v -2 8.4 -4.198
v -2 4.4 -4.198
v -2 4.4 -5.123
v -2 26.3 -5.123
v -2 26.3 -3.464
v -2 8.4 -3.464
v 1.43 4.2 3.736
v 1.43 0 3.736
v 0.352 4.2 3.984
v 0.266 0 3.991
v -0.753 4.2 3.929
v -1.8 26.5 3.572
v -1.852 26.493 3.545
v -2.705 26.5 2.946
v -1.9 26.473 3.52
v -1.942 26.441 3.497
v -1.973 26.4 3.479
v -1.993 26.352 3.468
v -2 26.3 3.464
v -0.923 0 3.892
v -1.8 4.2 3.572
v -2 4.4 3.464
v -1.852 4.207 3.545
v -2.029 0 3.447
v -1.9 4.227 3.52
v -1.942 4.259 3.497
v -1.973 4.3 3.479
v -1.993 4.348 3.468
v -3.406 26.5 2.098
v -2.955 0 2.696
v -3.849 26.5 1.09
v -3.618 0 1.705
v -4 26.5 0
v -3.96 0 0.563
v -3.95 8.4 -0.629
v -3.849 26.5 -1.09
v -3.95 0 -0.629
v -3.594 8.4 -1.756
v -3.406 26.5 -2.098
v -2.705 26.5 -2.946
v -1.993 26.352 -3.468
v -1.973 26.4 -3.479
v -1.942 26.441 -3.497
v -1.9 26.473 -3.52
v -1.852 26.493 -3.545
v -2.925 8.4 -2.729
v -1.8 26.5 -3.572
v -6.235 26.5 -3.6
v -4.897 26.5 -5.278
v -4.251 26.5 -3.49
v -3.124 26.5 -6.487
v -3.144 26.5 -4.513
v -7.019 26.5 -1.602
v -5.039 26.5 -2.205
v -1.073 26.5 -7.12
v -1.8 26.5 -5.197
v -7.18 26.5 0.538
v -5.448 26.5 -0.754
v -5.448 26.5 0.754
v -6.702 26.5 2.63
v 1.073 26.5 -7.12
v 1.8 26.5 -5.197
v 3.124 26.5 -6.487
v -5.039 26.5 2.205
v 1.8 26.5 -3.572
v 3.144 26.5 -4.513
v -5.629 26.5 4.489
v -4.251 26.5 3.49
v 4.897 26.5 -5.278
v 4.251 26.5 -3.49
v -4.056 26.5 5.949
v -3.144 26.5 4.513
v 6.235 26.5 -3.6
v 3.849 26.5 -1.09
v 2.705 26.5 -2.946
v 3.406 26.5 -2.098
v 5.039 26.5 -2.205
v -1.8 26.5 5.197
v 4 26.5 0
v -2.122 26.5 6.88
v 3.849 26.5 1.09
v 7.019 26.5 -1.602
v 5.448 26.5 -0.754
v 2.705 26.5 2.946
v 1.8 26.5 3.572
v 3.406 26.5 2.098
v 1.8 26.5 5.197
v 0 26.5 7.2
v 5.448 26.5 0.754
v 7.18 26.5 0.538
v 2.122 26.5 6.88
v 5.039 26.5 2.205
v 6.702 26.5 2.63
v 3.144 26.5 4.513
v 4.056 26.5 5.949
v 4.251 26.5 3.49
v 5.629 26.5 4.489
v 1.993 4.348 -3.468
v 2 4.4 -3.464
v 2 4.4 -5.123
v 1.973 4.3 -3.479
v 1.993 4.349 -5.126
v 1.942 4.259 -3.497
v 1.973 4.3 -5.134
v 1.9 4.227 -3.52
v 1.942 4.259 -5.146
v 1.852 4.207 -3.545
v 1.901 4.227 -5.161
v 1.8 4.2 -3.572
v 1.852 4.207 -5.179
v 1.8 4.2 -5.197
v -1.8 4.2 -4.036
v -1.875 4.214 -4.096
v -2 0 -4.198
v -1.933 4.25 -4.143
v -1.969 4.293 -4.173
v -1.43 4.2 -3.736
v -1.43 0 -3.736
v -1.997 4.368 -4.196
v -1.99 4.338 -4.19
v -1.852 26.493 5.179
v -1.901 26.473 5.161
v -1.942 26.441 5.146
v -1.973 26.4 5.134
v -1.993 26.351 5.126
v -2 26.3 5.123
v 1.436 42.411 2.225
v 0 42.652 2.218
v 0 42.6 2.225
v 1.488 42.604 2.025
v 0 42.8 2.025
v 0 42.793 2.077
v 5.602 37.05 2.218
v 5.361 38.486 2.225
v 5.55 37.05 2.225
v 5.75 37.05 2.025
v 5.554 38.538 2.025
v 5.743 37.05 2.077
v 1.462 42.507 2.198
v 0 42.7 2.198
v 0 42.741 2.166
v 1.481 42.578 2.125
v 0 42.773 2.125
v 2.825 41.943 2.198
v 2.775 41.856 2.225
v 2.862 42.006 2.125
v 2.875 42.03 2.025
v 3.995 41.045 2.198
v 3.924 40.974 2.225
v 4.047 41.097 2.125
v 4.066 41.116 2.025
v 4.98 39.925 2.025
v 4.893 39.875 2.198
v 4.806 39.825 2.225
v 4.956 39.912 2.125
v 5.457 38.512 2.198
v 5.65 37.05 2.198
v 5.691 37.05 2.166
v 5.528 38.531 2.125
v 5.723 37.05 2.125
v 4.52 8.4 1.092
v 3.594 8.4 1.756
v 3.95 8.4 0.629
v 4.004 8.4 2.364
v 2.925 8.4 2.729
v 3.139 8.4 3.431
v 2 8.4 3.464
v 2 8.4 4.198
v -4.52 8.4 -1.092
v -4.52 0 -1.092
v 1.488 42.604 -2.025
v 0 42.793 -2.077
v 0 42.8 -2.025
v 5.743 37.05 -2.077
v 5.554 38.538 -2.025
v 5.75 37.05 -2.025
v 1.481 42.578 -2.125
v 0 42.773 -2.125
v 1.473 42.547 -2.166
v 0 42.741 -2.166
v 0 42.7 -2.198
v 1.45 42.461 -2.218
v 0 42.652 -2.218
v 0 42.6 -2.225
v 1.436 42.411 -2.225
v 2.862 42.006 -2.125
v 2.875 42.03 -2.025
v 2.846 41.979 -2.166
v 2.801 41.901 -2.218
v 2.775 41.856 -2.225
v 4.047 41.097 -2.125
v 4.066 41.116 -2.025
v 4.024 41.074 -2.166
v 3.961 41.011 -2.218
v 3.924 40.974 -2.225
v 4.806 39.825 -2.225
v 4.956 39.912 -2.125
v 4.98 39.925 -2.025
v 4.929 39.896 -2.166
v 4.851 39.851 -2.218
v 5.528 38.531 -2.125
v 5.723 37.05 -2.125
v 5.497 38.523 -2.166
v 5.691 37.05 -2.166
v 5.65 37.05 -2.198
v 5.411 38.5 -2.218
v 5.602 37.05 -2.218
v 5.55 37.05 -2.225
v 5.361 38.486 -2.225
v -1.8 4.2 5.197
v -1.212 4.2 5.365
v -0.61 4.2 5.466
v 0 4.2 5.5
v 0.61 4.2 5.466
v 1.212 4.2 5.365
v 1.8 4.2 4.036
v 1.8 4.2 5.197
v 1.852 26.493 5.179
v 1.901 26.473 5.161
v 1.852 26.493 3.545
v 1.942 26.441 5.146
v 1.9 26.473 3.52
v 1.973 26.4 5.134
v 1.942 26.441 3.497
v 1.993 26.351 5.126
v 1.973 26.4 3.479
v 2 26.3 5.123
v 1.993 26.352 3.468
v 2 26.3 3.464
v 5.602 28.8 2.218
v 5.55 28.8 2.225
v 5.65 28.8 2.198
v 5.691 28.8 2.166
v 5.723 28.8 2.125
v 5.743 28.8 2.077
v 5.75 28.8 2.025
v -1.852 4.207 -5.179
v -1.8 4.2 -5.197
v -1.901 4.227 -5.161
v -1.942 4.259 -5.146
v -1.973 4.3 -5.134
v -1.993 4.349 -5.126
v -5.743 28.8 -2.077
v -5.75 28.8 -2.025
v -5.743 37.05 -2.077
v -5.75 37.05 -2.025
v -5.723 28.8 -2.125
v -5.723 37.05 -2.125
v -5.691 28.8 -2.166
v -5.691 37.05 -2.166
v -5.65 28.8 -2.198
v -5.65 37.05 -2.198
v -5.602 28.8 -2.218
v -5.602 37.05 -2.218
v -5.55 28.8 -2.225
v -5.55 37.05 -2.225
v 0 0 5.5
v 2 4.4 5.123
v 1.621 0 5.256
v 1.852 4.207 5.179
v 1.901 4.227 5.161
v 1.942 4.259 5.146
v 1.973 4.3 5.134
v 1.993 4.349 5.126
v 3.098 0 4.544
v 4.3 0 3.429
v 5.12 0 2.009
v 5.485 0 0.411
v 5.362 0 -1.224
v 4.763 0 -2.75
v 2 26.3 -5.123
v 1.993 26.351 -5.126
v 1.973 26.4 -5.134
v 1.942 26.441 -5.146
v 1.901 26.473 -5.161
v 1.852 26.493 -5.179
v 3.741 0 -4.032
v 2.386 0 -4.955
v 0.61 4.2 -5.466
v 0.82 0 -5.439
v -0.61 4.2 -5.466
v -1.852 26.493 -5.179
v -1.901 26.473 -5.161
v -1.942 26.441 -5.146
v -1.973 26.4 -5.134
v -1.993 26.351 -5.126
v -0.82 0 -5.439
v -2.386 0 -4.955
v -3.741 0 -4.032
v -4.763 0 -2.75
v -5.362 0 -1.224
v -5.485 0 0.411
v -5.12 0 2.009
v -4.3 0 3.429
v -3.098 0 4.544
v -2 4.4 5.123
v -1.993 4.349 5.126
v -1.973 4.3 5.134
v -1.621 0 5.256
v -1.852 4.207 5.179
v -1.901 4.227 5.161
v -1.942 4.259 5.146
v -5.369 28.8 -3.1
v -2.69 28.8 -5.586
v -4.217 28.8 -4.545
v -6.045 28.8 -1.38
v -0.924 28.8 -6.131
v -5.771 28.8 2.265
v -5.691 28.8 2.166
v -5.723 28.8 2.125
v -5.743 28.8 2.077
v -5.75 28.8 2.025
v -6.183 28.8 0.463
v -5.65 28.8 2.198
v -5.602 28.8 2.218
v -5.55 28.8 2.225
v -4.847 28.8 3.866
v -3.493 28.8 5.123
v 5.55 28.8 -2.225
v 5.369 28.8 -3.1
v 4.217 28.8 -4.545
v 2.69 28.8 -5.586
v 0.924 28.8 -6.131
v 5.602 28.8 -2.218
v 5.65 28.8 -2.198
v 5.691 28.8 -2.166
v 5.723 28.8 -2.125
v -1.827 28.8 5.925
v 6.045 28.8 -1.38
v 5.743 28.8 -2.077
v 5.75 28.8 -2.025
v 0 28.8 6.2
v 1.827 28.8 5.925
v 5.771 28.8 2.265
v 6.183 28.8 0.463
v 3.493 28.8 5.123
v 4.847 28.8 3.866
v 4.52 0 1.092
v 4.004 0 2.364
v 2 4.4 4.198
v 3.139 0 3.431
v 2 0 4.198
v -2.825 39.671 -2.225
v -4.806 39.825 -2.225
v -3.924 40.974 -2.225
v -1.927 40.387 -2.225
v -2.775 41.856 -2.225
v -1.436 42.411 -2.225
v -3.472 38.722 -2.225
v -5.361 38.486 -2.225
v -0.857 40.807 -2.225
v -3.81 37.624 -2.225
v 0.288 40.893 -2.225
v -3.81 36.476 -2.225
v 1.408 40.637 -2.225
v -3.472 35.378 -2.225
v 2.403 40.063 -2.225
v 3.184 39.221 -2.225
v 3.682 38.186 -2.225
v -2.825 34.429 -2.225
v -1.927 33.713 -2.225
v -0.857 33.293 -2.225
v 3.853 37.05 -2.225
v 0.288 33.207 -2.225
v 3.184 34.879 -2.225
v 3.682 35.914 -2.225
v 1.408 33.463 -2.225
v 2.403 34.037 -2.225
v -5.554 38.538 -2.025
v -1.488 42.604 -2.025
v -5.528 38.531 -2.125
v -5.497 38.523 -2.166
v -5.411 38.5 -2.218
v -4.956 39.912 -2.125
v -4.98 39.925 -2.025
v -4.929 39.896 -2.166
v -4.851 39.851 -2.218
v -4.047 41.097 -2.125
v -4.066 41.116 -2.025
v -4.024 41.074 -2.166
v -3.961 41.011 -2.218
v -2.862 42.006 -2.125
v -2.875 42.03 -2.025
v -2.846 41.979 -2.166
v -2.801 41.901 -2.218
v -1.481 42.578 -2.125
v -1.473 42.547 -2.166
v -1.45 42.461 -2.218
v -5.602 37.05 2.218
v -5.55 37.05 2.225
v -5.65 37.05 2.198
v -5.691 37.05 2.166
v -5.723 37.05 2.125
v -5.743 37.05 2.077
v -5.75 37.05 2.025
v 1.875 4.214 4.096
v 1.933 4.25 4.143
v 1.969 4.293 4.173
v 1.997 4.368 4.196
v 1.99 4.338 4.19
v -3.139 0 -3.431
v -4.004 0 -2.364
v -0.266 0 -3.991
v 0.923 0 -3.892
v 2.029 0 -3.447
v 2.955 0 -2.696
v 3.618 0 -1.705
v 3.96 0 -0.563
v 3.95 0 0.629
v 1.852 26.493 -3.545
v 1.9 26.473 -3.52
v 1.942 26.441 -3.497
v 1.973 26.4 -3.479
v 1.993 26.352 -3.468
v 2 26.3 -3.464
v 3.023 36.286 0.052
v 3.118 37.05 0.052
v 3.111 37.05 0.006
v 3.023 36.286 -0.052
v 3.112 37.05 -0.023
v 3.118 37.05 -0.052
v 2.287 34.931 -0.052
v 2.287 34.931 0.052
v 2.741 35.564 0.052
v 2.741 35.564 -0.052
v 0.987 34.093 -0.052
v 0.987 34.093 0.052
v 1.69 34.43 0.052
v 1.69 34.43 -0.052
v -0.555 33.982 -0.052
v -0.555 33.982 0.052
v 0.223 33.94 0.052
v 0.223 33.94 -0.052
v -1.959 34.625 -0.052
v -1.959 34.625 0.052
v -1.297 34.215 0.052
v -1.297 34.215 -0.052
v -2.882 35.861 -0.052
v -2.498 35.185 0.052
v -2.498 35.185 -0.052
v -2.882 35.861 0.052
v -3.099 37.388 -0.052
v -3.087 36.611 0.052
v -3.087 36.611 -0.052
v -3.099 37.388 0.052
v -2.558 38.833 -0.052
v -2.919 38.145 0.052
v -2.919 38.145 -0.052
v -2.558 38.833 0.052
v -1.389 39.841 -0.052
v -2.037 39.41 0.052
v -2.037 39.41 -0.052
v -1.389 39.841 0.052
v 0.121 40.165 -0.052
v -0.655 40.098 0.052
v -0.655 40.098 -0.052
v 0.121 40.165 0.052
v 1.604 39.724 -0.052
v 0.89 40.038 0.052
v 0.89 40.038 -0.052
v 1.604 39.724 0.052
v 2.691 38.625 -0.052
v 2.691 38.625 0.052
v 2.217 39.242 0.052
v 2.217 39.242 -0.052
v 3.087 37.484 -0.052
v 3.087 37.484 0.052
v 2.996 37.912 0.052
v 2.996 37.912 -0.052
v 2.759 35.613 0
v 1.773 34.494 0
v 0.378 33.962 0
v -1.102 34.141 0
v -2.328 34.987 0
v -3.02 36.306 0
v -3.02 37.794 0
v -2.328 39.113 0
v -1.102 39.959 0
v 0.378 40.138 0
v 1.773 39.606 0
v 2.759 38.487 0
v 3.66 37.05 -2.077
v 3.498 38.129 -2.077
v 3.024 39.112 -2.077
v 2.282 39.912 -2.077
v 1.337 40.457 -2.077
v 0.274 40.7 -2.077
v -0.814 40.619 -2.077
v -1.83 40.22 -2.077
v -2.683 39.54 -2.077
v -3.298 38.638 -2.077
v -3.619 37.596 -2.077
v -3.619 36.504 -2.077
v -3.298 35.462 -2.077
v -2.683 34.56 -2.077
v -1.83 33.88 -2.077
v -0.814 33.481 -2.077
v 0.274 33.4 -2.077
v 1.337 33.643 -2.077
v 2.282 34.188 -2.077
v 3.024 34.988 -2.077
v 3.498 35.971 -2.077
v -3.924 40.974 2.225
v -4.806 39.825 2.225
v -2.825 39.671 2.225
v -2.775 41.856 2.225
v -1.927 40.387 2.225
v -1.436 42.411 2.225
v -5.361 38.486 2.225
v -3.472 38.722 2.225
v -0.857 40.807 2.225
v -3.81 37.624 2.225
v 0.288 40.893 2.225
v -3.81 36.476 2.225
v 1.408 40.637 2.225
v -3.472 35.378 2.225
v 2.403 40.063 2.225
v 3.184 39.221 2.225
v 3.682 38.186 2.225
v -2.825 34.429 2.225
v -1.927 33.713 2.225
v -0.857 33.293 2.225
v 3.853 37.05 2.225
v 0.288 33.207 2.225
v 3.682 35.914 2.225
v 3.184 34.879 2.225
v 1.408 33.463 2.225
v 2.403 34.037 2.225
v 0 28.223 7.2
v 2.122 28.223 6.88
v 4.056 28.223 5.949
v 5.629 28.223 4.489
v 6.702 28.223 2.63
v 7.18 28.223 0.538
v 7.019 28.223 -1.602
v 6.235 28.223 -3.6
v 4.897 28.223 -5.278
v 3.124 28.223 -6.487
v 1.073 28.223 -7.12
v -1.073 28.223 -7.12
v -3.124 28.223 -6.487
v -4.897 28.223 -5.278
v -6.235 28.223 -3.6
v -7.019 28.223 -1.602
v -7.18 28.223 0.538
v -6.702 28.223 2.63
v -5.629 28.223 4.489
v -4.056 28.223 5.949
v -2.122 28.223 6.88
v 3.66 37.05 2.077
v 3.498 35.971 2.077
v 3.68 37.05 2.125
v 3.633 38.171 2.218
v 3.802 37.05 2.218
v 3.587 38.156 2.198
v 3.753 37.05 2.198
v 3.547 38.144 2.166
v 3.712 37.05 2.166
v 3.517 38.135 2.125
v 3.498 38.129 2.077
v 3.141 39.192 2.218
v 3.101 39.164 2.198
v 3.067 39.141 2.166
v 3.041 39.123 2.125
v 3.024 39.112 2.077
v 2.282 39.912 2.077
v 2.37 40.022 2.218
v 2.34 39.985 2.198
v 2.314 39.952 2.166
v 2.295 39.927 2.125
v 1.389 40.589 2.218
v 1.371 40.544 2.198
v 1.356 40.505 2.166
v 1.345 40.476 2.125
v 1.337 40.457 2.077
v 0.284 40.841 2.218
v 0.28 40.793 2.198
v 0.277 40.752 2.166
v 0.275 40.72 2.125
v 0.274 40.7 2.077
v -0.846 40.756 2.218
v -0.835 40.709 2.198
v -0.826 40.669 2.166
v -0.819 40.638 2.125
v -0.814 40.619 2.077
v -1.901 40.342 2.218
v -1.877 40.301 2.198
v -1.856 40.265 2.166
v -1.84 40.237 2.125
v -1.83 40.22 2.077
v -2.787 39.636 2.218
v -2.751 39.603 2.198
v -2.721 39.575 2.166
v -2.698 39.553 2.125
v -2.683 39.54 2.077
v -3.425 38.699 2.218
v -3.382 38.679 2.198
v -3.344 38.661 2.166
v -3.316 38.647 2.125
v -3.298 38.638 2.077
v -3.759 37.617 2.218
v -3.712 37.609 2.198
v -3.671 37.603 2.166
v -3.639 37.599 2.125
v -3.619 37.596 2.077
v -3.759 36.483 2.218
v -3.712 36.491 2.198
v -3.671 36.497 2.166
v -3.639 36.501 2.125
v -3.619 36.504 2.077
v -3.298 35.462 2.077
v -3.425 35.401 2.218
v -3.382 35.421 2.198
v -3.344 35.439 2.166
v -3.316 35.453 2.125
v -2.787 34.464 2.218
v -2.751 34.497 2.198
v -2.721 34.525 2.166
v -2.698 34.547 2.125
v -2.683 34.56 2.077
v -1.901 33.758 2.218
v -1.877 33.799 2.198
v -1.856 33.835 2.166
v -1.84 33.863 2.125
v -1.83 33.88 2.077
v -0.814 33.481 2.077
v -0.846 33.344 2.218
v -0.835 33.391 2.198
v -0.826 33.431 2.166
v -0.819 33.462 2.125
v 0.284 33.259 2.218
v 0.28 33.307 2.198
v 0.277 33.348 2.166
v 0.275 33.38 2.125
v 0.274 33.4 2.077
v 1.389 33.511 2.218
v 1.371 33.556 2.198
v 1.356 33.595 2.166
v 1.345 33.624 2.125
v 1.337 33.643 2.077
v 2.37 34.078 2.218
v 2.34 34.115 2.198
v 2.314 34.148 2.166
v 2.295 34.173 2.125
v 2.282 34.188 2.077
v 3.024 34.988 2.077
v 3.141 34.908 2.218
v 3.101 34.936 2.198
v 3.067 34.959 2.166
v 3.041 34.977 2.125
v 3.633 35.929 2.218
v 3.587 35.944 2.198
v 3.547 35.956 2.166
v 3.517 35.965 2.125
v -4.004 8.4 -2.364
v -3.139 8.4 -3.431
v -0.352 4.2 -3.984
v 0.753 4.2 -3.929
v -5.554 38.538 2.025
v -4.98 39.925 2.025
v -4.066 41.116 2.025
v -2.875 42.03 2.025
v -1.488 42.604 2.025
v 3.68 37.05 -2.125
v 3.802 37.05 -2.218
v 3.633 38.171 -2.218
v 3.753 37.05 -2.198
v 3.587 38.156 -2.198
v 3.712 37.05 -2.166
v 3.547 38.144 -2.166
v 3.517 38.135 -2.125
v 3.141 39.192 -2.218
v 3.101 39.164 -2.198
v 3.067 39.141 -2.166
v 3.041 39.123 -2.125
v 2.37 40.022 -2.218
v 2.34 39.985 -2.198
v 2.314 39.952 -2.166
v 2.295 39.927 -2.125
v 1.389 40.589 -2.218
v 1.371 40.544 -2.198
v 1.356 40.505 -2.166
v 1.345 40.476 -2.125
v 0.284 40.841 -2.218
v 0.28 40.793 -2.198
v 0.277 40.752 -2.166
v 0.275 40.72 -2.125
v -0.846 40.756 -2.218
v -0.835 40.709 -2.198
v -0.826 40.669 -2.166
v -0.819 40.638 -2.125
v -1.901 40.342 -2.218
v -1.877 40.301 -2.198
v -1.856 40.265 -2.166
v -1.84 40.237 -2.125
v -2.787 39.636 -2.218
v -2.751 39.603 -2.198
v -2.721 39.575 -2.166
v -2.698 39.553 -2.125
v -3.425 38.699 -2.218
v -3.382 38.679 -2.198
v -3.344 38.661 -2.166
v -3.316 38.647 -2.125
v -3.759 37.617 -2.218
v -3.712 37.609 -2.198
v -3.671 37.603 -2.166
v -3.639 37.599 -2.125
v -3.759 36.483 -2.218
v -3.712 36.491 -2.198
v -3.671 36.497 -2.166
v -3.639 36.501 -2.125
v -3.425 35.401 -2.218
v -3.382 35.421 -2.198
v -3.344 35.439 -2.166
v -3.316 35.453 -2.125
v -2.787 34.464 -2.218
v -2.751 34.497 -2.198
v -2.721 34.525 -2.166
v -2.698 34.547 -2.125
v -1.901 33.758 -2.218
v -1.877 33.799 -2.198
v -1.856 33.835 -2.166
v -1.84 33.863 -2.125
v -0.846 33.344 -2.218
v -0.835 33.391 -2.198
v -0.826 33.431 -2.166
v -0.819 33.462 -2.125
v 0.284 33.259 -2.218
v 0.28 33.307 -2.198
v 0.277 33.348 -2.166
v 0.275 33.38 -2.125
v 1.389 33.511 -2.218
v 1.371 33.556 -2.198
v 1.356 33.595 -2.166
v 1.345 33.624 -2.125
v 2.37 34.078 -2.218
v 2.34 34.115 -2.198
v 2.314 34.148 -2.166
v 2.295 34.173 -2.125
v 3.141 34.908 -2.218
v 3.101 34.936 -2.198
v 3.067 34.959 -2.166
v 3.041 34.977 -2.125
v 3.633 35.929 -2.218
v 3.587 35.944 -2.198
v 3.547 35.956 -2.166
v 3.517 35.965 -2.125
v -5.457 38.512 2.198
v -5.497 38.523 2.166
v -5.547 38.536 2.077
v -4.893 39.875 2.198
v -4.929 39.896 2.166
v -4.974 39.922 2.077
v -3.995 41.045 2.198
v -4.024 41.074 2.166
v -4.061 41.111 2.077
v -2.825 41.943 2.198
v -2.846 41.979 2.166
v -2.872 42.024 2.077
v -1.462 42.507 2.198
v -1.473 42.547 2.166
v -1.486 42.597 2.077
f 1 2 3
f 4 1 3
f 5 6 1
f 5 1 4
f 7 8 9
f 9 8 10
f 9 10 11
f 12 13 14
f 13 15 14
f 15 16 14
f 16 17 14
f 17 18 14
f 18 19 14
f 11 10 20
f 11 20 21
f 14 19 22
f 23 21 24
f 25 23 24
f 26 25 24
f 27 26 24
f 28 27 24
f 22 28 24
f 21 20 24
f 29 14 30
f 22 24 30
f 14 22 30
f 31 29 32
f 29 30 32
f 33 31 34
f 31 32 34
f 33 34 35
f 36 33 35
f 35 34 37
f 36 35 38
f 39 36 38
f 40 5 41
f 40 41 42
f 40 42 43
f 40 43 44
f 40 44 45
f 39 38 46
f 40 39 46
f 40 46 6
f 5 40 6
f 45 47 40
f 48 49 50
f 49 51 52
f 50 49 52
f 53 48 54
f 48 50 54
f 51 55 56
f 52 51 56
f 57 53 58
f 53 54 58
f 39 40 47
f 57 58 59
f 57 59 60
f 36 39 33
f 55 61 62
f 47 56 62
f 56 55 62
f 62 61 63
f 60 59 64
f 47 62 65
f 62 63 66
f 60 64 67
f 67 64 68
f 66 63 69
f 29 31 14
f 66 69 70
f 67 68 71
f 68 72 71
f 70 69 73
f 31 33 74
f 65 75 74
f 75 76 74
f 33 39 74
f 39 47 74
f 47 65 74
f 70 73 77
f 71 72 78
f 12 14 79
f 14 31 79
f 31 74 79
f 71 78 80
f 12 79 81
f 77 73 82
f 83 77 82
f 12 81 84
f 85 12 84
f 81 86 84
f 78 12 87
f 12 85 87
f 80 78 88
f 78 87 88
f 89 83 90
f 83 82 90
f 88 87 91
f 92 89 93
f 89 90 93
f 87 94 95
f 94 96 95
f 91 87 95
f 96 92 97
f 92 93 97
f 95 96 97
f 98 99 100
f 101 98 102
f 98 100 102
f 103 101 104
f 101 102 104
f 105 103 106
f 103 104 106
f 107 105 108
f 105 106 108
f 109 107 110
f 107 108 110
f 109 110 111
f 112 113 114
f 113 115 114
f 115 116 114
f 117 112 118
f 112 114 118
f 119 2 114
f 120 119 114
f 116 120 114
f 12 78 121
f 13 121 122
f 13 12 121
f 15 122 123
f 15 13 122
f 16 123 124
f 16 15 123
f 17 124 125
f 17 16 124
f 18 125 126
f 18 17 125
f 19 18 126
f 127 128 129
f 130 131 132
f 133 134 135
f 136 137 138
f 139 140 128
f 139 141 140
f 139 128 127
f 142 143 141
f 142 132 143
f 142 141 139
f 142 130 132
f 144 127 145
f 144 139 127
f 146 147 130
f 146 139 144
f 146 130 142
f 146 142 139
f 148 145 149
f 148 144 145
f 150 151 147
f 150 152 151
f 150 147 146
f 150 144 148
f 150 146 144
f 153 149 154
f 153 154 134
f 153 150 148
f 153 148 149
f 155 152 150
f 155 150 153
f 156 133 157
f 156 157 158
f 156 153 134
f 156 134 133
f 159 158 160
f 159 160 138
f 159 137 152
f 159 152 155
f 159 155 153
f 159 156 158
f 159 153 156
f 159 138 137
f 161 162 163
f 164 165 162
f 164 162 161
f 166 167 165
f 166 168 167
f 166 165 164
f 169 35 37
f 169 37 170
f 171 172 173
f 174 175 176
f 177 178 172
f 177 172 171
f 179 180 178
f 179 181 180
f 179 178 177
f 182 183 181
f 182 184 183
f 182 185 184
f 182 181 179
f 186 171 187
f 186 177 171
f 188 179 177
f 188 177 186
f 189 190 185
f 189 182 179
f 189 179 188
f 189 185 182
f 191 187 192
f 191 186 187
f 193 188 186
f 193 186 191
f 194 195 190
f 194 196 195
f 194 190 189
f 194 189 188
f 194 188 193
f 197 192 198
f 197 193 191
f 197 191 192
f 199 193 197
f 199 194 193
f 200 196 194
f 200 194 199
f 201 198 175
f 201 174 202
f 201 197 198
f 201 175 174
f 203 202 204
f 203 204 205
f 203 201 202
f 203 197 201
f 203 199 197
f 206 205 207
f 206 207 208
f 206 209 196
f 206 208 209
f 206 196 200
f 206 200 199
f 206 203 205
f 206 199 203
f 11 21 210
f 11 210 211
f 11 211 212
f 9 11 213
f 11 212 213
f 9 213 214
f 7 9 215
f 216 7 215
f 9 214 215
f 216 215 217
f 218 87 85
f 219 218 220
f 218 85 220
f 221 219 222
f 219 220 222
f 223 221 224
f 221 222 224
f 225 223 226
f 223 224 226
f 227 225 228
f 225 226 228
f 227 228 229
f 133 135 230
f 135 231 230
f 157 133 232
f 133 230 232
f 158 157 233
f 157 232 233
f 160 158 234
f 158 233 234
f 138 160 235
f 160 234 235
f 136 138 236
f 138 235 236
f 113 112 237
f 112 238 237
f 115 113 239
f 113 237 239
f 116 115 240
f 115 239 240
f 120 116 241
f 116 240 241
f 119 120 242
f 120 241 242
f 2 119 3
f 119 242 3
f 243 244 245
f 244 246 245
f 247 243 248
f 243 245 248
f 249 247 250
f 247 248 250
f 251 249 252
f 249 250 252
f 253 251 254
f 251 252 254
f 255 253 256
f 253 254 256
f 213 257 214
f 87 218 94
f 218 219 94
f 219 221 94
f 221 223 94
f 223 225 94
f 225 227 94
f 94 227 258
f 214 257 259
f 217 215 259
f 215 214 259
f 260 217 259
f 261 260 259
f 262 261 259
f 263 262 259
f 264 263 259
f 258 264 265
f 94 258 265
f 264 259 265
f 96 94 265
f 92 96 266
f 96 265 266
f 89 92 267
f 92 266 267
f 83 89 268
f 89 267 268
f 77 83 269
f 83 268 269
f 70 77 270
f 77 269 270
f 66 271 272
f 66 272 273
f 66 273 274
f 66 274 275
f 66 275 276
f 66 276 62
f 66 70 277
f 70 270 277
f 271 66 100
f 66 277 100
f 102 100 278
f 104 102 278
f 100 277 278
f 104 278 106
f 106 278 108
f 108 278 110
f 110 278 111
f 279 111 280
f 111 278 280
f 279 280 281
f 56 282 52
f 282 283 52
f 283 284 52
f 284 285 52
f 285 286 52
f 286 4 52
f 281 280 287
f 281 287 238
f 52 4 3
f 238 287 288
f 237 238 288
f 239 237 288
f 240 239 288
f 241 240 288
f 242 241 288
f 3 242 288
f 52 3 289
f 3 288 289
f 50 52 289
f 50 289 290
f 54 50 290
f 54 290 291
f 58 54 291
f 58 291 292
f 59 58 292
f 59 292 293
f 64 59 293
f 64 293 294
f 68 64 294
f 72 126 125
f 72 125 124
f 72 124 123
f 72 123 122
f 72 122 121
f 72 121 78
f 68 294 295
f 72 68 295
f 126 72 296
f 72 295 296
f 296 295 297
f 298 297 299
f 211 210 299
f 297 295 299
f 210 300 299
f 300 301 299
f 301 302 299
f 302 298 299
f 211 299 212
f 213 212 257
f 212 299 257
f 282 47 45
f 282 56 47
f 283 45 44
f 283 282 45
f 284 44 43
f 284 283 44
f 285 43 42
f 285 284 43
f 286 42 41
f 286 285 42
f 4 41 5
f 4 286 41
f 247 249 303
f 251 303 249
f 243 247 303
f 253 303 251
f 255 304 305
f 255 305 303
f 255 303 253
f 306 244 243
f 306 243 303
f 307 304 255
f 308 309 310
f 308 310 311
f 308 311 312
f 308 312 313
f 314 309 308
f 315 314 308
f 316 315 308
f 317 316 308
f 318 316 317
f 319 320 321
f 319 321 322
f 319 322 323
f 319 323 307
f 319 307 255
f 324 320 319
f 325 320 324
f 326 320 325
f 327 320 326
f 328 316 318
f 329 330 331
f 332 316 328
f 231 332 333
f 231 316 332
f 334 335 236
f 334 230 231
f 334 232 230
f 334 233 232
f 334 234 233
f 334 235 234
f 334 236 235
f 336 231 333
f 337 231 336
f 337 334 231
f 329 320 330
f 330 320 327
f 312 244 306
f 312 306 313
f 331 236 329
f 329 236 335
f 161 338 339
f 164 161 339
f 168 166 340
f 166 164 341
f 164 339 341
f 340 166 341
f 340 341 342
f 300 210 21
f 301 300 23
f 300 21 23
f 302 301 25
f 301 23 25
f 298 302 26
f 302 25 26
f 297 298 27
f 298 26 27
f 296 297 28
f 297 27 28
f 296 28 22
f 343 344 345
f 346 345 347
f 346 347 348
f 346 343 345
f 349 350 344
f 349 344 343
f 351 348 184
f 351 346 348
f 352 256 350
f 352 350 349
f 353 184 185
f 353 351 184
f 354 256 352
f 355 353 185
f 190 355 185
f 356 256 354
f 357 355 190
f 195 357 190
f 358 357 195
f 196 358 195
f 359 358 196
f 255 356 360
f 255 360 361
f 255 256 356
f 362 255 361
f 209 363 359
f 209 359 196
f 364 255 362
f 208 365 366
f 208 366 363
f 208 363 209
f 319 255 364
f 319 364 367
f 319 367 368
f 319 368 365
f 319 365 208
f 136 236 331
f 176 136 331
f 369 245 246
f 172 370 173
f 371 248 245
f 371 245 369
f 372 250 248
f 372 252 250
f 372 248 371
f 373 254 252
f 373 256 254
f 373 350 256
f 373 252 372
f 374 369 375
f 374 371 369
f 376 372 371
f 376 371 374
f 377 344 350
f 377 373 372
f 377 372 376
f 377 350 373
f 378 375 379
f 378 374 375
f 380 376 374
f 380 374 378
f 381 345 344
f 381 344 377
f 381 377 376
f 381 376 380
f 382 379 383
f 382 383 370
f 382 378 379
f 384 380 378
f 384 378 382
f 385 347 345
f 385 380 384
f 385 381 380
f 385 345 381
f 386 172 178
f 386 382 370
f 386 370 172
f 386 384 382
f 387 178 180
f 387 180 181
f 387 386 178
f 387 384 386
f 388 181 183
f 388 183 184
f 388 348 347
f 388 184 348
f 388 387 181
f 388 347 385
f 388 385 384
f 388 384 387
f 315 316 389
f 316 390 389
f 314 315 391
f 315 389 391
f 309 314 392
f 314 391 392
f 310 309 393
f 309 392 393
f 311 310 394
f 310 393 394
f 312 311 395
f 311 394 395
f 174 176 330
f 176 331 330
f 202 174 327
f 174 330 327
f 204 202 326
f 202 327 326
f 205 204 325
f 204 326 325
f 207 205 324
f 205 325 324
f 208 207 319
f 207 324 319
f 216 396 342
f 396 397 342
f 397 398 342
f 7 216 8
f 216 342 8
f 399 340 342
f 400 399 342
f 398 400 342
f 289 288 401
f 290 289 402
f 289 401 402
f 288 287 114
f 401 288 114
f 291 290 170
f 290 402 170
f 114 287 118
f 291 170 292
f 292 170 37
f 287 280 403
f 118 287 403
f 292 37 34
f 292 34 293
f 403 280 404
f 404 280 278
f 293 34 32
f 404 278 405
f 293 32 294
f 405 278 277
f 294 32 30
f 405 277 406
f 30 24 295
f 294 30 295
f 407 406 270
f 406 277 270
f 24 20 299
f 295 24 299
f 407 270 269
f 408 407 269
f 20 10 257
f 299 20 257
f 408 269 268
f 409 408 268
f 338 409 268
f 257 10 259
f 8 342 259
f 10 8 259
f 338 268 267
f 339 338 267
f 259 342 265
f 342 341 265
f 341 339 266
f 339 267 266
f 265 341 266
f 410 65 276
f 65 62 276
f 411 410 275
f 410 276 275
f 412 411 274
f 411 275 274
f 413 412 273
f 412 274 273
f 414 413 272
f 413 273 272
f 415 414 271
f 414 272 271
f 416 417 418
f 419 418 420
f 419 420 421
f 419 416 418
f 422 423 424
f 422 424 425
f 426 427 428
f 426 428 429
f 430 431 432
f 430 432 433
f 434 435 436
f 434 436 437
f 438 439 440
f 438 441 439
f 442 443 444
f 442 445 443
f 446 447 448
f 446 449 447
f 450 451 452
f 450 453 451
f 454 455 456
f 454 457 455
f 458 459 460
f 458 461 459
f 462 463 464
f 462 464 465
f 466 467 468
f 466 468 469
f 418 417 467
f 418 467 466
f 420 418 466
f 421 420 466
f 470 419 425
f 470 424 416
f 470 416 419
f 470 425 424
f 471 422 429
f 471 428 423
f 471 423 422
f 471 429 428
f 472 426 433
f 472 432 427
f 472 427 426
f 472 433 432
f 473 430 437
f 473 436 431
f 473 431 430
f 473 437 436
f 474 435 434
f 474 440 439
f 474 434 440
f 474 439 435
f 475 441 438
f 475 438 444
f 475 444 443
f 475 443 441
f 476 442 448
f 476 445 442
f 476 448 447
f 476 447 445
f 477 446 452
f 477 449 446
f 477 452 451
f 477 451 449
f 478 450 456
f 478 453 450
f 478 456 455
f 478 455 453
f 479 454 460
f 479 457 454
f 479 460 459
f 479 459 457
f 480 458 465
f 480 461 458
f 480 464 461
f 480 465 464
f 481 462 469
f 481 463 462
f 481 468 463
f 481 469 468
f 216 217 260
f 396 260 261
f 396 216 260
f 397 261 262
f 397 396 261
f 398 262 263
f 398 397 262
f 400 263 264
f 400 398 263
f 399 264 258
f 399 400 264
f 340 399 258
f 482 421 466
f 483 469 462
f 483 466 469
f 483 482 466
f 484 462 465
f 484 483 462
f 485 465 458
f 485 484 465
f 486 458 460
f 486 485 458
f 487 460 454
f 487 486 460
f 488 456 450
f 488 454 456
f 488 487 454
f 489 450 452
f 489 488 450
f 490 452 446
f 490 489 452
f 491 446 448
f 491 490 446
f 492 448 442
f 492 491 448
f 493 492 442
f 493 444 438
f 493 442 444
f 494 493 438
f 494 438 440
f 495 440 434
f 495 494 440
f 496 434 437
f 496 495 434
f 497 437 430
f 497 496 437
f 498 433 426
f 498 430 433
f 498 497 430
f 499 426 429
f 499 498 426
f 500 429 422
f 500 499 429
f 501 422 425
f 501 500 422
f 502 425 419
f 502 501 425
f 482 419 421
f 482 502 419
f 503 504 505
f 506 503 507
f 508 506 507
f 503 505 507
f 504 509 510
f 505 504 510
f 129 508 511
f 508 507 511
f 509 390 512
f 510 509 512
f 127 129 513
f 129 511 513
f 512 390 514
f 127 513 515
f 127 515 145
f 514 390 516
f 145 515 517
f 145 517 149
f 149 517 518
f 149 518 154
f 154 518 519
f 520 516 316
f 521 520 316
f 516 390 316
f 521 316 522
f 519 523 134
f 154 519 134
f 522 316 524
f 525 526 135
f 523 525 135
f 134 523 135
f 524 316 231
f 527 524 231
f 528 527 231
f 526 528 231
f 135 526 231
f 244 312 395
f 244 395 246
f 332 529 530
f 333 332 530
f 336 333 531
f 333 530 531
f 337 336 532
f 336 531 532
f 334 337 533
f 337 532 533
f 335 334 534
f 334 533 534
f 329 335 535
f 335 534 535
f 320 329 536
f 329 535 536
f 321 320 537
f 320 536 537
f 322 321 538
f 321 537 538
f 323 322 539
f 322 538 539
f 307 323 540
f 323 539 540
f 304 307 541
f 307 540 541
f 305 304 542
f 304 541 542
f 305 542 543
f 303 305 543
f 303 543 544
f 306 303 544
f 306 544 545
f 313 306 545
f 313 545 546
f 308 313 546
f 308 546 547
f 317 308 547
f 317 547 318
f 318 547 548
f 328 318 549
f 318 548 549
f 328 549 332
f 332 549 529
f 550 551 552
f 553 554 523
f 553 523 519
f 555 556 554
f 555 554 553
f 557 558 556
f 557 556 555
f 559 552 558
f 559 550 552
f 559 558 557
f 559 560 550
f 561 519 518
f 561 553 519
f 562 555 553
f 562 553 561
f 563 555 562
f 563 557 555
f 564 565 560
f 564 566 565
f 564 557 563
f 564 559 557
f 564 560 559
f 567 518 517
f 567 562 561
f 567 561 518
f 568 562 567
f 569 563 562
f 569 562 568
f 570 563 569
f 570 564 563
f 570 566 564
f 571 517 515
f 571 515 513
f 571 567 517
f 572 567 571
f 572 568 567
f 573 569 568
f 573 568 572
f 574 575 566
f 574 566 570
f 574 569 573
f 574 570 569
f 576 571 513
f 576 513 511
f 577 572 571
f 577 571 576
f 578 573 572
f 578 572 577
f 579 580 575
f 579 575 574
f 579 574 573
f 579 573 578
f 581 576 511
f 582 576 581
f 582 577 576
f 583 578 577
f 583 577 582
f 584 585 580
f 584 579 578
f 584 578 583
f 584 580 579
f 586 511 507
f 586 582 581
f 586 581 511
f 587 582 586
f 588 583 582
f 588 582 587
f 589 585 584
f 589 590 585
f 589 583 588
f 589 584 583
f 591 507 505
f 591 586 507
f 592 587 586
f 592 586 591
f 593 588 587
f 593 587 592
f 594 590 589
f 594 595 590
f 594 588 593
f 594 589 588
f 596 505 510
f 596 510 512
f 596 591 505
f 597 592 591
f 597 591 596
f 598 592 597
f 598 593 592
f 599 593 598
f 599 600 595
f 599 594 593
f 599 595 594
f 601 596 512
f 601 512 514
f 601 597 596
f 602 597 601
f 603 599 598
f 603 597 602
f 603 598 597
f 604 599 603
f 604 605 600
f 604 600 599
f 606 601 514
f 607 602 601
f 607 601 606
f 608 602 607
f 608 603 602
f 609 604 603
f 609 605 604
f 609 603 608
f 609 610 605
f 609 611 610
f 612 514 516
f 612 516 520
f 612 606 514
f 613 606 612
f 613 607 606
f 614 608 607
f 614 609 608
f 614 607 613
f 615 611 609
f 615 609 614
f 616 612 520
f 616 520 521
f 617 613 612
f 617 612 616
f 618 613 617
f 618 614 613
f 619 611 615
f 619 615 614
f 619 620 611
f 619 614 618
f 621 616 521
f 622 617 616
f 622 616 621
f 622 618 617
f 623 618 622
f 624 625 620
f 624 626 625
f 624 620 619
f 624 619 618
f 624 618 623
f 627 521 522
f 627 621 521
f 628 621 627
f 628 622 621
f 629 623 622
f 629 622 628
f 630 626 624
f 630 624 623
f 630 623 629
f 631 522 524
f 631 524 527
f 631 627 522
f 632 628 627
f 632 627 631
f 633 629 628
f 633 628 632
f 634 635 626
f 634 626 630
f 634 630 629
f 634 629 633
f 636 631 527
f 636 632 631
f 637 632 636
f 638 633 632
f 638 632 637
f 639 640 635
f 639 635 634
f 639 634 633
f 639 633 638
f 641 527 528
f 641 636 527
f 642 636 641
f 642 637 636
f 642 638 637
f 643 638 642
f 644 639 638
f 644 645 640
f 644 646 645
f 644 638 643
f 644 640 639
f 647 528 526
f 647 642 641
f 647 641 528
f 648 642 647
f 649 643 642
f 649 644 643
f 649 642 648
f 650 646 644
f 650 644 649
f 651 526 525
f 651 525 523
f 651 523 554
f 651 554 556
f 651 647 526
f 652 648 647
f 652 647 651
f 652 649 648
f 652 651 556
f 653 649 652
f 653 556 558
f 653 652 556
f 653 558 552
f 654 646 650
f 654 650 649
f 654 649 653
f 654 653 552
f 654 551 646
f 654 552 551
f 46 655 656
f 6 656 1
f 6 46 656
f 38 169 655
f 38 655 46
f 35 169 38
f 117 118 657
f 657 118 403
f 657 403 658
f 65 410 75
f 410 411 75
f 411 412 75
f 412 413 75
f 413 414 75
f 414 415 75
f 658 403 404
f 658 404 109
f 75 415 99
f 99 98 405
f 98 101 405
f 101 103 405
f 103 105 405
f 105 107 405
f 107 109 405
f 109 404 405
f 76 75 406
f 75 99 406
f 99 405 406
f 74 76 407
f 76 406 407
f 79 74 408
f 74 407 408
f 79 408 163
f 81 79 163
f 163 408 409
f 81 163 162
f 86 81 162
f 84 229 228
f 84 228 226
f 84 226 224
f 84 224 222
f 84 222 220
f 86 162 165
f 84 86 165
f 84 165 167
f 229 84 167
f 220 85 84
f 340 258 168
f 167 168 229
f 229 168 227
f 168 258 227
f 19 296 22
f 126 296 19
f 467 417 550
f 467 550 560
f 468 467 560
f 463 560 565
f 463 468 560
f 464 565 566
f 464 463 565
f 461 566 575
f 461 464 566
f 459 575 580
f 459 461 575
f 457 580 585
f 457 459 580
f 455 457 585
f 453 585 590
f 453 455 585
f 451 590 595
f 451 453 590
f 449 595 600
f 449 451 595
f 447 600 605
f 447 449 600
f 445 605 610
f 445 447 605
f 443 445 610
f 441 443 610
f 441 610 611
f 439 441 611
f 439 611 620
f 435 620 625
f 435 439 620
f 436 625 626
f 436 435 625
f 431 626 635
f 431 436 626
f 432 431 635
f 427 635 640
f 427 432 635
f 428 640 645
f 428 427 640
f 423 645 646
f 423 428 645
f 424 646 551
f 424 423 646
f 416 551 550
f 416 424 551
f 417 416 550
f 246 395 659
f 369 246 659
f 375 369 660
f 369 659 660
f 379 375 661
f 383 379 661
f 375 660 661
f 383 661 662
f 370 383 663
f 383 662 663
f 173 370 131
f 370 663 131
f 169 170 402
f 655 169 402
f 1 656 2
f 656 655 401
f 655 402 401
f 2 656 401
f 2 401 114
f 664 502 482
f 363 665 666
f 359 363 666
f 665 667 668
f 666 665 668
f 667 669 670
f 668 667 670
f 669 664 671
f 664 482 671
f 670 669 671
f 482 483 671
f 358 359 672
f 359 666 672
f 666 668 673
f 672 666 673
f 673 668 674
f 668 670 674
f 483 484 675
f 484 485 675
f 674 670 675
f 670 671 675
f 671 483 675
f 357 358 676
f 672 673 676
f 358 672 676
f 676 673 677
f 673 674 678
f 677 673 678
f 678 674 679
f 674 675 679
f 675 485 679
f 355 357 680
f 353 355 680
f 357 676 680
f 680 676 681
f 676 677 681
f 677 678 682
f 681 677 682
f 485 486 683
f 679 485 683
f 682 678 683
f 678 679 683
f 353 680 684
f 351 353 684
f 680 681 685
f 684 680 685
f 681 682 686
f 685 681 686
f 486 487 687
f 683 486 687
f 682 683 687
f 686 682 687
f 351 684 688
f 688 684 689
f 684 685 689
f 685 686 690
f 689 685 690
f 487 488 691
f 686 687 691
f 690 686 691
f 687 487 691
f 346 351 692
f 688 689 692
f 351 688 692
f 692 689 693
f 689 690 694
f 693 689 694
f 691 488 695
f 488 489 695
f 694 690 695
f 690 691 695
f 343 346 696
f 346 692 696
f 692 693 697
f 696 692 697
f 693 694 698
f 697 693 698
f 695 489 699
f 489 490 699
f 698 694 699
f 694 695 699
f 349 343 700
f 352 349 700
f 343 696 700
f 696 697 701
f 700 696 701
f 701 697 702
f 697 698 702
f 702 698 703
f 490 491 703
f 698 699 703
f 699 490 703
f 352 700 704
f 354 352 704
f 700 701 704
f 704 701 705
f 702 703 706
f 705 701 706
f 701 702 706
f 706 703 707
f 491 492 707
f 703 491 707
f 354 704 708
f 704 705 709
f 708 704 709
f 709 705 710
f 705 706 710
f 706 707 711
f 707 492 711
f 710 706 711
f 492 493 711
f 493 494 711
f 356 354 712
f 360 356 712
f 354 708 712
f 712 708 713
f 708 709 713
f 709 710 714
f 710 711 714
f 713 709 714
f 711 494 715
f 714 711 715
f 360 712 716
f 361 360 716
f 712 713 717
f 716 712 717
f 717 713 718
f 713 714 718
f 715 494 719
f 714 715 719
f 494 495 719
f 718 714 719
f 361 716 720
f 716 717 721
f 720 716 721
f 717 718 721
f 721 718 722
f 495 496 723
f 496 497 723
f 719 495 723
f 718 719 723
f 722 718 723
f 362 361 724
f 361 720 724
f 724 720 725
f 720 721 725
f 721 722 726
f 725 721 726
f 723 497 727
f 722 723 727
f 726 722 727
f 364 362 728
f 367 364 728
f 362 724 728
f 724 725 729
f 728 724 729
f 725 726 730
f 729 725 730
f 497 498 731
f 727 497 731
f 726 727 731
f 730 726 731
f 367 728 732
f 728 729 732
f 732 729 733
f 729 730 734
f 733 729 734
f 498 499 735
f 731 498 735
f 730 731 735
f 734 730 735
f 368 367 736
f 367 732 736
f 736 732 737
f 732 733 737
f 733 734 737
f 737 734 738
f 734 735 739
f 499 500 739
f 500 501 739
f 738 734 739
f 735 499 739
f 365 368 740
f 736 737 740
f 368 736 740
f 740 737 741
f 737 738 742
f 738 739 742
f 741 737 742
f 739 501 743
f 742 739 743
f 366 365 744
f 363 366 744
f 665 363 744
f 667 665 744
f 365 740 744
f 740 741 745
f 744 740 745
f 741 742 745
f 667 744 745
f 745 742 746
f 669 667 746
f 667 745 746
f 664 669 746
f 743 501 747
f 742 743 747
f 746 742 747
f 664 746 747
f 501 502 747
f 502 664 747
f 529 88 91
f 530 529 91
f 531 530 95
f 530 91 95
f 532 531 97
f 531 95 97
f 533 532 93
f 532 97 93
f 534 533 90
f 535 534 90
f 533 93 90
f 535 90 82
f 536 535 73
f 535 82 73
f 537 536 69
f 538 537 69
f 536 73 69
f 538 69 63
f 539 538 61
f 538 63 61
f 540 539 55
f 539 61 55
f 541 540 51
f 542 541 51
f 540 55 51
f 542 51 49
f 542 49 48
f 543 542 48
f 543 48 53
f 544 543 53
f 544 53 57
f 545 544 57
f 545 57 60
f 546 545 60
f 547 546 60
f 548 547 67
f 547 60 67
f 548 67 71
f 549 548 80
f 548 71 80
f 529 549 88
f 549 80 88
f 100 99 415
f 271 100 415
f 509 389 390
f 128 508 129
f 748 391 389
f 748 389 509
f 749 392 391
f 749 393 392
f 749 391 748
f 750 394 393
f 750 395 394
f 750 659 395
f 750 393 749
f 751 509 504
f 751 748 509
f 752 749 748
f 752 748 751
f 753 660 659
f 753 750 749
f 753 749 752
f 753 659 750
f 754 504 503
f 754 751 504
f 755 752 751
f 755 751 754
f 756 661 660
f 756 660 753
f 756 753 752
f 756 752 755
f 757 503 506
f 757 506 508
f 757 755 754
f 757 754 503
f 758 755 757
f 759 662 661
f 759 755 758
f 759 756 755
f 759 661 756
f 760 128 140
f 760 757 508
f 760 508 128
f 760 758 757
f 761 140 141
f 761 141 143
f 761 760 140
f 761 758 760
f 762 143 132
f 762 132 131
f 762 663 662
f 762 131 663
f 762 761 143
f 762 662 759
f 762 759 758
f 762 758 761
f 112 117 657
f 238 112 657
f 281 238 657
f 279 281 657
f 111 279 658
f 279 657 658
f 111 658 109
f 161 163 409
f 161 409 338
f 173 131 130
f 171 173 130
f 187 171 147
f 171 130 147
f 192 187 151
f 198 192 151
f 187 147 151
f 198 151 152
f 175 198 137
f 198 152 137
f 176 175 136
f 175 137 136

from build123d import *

# Parameters (mm, degrees)
CROQUIS1_R              = 5.5
SALIENTE_EXTRUIR1_DEPTH = 26.5
CROQUIS2_R              = 7.2
SALIENTE_EXTRUIR2_DEPTH = 2.3
CROQUIS3_W              = 11.5
CROQUIS3_H              = 4.45
SALIENTE_EXTRUIR3_DEPTH = 14
CORTAR_EXTRUIR1_DEPTH   = 13.37
CROQUIS6_R              = 4
CORTAR_EXTRUIR2_DEPTH   = 26.5
CROQUIS7_R              = 2.8
CORTAR_EXTRUIR3_DEPTH   = 26.37
CHAFL_N1_SIZE           = 0.9
CHAFL_N1_SIZE2          = 3.358845727
CHAFL_N2_SIZE           = 3.358845727
CHAFL_N2_SIZE_2         = 0.9
REDONDEO1_R             = 0.2
REDONDEO2_R             = 0.2
CROQUIS11_W             = 4
CROQUIS11_H             = 22.3
CORTAR_EXTRUIR4_DEPTH   = 48.550085436
CORTAR_EXTRUIR5_DEPTH   = 8.4
REDONDEO3_R             = 0.2
CHAFL_N3_SIZE           = 1
CHAFL_N3_SIZE2          = 0.577350269


with BuildPart() as part:
    # Croquis1 → Saliente-Extruir1 (new body)
    with BuildSketch(Plane(origin=(0, 0, 0), x_dir=(1, 0, 0), z_dir=(0, 1, 0))):
        with Locations(Location((0, 0, 0), (0, 0, 270))):
            Circle(CROQUIS1_R)
    extrude(amount=SALIENTE_EXTRUIR1_DEPTH)

    # Croquis2 → Saliente-Extruir2 (add)
    with BuildSketch(Plane(origin=(0, 26.5, 0), x_dir=(1, 0, 0), z_dir=(0, 1, 0))):
        with Locations(Location((0, 0, 0), (0, 0, 270))):
            Circle(CROQUIS2_R)
    extrude(amount=SALIENTE_EXTRUIR2_DEPTH)

    # Croquis3 → Saliente-Extruir3 (add)
    with BuildSketch(Plane(origin=(0, 28.8, 0), x_dir=(1, 0, 0), z_dir=(0, 1, 0))):
        Rectangle(CROQUIS3_W, CROQUIS3_H)
    extrude(amount=SALIENTE_EXTRUIR3_DEPTH)

    # Croquis4 → Cortar-Extruir1 (cut)
    with BuildSketch(Plane.XY.offset(2.225)):
        with BuildLine():
            Line((5.75, 42.8), (0, 42.8))
            ThreePointArc((0, 42.8), (4.065863992, 41.115863992), (5.75, 37.05))
            Line((5.75, 37.05), (5.75, 42.8))
        make_face()
        with BuildLine():
            Line((0, 42.8), (-5.75, 42.8))
            Line((-5.75, 42.8), (-5.75, 37.05))
            ThreePointArc((-5.75, 37.05), (-4.065863992, 41.115863992), (0, 42.8))
        make_face()
    extrude(amount=-CORTAR_EXTRUIR1_DEPTH, mode=Mode.SUBTRACT)

    # Croquis6 → Cortar-Extruir2 (cut)
    with BuildSketch(Plane.XZ):
        with Locations(Location((0, 0, 0), (0, 0, 270))):
            Circle(CROQUIS6_R)
    extrude(amount=-CORTAR_EXTRUIR2_DEPTH, mode=Mode.SUBTRACT)

    # Croquis7 → Cortar-Extruir3 (cut)
    with BuildSketch(Plane.XY.offset(2.225)):
        with Locations((0, 37.05)):
            Circle(CROQUIS7_R)
    extrude(amount=-CORTAR_EXTRUIR3_DEPTH, mode=Mode.SUBTRACT)

    # Chaflán1
    chafl_n1_edges = [part.edges().sort_by_distance(p)[0] for p in [
        (-2.8, 37.05, 2.225),
    ]]
    chafl_n1_side = [part.faces().sort_by_distance(p)[0] for p in [
        (0, 28.981176709, 2.225),
    ]]
    chamfer(chafl_n1_edges, length=CHAFL_N1_SIZE, length2=CHAFL_N1_SIZE2, reference=chafl_n1_side[0])

    # Chaflán2
    # the kernel refuses this chamfer: 3.358845727, 0.9 mm, written as the material it takes off along each edge
    with BuildSketch(Plane(origin=(0, 37.05, -2.225), x_dir=(1, 0, 0), z_dir=(0, -1, 0))) as chafl_n2_piece_1:
        Polygon((2.8, CHAFL_N2_SIZE), (2.8 + CHAFL_N2_SIZE_2, 0), (2.8, 0), align=None)
    revolve(axis=Axis((0, 37.05, -2.225), (0, 0, 1)), mode=Mode.SUBTRACT)

    # Redondeo1
    redondeo1_edges = [part.edges().sort_by_distance(p)[0] for p in [
        (-5.75, 32.925, 2.225),
        (-5.75, 32.925, -2.225),
        (0, 42.8, 2.225),
        (0, 42.8, -2.225),
        (5.75, 32.925, -2.225),
        (5.75, 32.925, 2.225),
    ]]
    fillet(redondeo1_edges, radius=REDONDEO1_R)

    # Redondeo2
    redondeo2_edges = [part.edges().sort_by_distance(p)[0] for p in [
        (-3.7, 37.05, 2.225),
        (-3.7, 37.05, -2.225),
        (-3.103813047, 37.05, 0),
    ]]
    fillet(redondeo2_edges, radius=REDONDEO2_R)

    # Croquis11 → Cortar-Extruir4 (cut, through all)
    with BuildSketch(Plane.XY.offset(12.225)):
        with Locations((0, 15.35)):
            Rectangle(CROQUIS11_W, CROQUIS11_H)
    extrude(amount=-CORTAR_EXTRUIR4_DEPTH, mode=Mode.SUBTRACT)

    # Croquis13 → Cortar-Extruir5 (cut)
    with BuildSketch(Plane.XZ):
        with BuildLine():
            Line((-2, -4.19791615), (4.520060123, 1.091584394))
            ThreePointArc((4.520060123, 1.091584394), (3.611110666, 2.929569892), (2, 4.19791615))
            Line((2, 4.19791615), (-4.520060123, -1.091584394))
            ThreePointArc((-4.520060123, -1.091584394), (-3.611110666, -2.929569892), (-2, -4.19791615))
        make_face()
    extrude(amount=-CORTAR_EXTRUIR5_DEPTH, mode=Mode.SUBTRACT)

    # Redondeo3
    redondeo3_edges = [part.edges().sort_by_distance(p)[0] for p in [
        (-2, 4.2, -4.660695766),
        (-2, 4.2, 4.293788499),
        (-2, 26.5, -4.293788499),
        (-2, 26.5, 4.293788499),
        (2, 26.5, 4.293788499),
        (2, 26.5, -4.293788499),
        (2, 4.2, -4.293788499),
        (2, 4.2, 4.660695766),
    ]]
    fillet(redondeo3_edges, radius=REDONDEO3_R)

    # Chaflán3
    chafl_n3_edges = [part.edges().sort_by_distance(p)[0] for p in [
        (0, 28.8, -7.2),
    ]]
    chafl_n3_side = [part.faces().sort_by_distance(p)[0] for p in [
        (-5.953646753, 28.8, 0),
    ]]
    chamfer(chafl_n3_edges, length=CHAFL_N3_SIZE, length2=CHAFL_N3_SIZE2, reference=chafl_n3_side[0])


solid = part.part
